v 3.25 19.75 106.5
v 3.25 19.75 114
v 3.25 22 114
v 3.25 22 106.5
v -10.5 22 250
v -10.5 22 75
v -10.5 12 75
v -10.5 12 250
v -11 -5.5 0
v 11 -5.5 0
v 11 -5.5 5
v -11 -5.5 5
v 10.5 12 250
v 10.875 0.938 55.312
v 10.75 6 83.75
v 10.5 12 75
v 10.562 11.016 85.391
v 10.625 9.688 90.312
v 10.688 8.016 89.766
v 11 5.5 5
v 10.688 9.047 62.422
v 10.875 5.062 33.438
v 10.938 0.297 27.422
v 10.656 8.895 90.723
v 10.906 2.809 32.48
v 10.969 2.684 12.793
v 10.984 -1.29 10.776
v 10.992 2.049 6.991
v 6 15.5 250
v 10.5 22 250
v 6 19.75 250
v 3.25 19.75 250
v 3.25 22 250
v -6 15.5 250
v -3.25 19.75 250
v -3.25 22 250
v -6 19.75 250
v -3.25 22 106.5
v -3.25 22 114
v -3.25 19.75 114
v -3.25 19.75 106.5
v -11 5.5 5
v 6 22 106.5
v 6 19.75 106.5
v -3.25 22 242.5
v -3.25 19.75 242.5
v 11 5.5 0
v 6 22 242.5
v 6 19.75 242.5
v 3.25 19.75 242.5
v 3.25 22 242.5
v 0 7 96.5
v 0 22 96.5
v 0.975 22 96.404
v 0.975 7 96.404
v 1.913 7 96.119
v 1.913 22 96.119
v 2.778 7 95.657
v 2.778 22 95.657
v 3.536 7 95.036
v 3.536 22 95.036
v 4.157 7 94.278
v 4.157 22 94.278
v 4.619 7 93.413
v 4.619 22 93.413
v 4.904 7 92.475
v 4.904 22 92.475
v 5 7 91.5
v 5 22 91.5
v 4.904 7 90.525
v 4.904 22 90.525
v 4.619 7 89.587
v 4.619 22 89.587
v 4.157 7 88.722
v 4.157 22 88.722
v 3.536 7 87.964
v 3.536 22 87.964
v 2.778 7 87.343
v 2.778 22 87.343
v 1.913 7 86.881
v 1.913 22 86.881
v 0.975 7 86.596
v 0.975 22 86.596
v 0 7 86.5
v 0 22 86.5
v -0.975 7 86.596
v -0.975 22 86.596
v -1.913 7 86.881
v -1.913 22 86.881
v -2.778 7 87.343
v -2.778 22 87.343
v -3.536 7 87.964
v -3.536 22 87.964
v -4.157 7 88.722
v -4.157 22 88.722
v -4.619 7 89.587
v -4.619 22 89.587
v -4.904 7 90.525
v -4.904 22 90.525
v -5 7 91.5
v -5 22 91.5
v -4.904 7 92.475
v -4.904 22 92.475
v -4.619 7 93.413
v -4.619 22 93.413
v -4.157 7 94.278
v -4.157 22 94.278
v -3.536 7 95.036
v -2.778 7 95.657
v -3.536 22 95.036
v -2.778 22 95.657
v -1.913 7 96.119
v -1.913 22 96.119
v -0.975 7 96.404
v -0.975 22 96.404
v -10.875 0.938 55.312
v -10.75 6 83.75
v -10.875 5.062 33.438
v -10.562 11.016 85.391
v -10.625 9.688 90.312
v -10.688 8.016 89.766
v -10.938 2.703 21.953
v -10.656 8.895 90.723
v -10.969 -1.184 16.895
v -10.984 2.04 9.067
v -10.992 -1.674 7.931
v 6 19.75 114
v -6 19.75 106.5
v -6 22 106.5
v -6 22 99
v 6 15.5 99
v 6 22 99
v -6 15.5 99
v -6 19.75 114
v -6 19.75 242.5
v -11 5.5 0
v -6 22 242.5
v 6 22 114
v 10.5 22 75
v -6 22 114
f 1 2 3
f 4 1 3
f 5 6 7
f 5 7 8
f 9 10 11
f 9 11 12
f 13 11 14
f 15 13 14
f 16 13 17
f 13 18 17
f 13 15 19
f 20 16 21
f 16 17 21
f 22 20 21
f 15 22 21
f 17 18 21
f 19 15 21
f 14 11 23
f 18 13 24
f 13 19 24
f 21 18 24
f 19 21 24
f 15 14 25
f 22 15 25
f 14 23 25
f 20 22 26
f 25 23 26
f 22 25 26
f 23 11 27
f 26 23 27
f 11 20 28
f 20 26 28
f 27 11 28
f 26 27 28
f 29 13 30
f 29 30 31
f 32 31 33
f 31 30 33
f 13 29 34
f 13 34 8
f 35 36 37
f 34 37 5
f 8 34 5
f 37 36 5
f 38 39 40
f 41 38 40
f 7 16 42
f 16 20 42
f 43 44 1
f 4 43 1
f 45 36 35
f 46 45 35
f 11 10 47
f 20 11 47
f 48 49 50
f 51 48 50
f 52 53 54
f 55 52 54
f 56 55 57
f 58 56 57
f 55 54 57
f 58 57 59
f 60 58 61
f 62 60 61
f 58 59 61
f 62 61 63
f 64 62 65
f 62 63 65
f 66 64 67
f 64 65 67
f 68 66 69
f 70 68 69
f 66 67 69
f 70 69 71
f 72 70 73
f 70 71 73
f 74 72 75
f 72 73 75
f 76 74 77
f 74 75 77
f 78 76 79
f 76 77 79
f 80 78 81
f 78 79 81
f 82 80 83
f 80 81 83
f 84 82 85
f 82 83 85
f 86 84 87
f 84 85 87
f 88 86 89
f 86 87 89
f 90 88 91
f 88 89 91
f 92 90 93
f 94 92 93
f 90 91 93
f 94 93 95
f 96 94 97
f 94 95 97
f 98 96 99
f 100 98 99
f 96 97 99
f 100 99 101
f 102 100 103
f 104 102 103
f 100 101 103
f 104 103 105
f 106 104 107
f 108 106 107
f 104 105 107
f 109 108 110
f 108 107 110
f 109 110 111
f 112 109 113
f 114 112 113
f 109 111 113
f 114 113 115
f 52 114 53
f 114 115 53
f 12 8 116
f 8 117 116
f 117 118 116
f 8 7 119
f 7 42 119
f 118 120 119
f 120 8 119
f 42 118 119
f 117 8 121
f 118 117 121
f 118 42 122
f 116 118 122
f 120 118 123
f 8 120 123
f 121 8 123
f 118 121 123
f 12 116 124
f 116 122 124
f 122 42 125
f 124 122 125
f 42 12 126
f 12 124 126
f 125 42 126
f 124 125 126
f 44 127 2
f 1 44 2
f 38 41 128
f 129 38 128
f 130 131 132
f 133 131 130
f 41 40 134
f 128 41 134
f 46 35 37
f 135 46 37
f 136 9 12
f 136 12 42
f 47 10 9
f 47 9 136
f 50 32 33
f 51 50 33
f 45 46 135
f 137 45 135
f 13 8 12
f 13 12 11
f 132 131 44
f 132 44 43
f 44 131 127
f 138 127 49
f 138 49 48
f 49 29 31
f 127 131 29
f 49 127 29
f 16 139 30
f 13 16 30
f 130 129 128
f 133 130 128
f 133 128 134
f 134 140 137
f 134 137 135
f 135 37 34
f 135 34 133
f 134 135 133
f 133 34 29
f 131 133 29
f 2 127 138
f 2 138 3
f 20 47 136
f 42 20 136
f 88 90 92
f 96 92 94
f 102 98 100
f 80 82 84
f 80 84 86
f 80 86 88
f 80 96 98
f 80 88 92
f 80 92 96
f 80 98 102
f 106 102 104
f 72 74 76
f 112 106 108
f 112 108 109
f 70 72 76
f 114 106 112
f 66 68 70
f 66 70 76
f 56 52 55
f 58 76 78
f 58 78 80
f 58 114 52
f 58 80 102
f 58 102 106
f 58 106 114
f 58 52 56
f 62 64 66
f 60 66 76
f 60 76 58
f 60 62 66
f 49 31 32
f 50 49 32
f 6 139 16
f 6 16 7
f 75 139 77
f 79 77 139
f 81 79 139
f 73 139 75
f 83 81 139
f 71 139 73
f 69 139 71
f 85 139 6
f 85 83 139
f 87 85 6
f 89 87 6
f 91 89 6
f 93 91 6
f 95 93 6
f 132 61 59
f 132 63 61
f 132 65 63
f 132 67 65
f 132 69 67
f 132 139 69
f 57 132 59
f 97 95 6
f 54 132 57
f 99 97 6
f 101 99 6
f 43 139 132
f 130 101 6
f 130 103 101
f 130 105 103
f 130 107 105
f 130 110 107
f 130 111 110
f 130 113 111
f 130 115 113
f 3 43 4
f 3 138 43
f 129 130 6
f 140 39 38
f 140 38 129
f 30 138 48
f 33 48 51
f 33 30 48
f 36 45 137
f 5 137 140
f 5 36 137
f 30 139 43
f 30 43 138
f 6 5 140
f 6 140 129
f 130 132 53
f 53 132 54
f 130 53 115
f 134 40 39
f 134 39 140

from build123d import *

# Parameters (mm, degrees)
SKETCH1_W           = 11
SKETCH1_H           = 22
BOSS_EXTRUDE1_DEPTH = 5
SKETCH3_W           = 21
SKETCH3_H           = 175
BOSS_EXTRUDE2_DEPTH = 10
CUT_EXTRUDE1_DEPTH  = 151
SKETCH5_R           = 5
CUT_EXTRUDE2_DEPTH  = 15
CUT_EXTRUDE3_START  = -2.25
SKETCH6_W           = 12
SKETCH6_H           = 128.5
SKETCH6_H_2         = 7.5
CUT_EXTRUDE3_DEPTH  = 2.25


with BuildPart() as part:
    # Sketch1 → Boss-Extrude1 (new body)
    with BuildSketch(Plane(origin=(0, 0, 0), x_dir=(0, 1, 0), z_dir=(0, 0, 1))):
        Rectangle(SKETCH1_W, SKETCH1_H)
    extrude(amount=BOSS_EXTRUDE1_DEPTH)


with BuildPart() as body_2:
    # Sketch3 → Boss-Extrude2 (new body)
    with BuildSketch(Plane(origin=(0, 22, 0), x_dir=(-1, 0, 0), z_dir=(0, 1, 0))):
        with Locations((0, 162.5)):
            Rectangle(SKETCH3_W, SKETCH3_H)
    extrude(amount=-BOSS_EXTRUDE2_DEPTH)


    add(part.part)  # loft1 joins it to this body
    # loft from a face of the part (loft1)
    loft([body_2.faces().sort_by_distance((0, 12, 162.5))[0], body_2.faces().sort_by_distance((0, 0, 5))[0]])

    # Sketch4 → Cut-Extrude1 (cut)
    with BuildSketch(Plane.XY.offset(250)):
        Polygon((-3.25, 22), (-3.25, 19.75), (-6, 19.75), (-6, 15.5), (6, 15.5), (6, 19.75), (3.25, 19.75), (3.25, 22), align=None)
    extrude(amount=-CUT_EXTRUDE1_DEPTH, mode=Mode.SUBTRACT)

    # Sketch5 → Cut-Extrude2 (cut)
    with BuildSketch(Plane(origin=(0, 22, 0), x_dir=(-1, 0, 0), z_dir=(0, 1, 0))):
        with Locations(Location((0, 91.5, 0), (0, 0, 90))):
            Circle(SKETCH5_R)
    extrude(amount=-CUT_EXTRUDE2_DEPTH, mode=Mode.SUBTRACT)

    # Sketch6 → Cut-Extrude3 (cut)
    with BuildSketch(Plane(origin=(0, 22, 0), x_dir=(-1, 0, 0), z_dir=(0, 1, 0)).offset(CUT_EXTRUDE3_START)):
        with Locations((0, 178.25)):
            Rectangle(SKETCH6_W, SKETCH6_H)
        with Locations((0, 102.75)):
            Rectangle(SKETCH6_W, SKETCH6_H_2)
    extrude(amount=CUT_EXTRUDE3_DEPTH, mode=Mode.SUBTRACT)


solid = body_2.part
